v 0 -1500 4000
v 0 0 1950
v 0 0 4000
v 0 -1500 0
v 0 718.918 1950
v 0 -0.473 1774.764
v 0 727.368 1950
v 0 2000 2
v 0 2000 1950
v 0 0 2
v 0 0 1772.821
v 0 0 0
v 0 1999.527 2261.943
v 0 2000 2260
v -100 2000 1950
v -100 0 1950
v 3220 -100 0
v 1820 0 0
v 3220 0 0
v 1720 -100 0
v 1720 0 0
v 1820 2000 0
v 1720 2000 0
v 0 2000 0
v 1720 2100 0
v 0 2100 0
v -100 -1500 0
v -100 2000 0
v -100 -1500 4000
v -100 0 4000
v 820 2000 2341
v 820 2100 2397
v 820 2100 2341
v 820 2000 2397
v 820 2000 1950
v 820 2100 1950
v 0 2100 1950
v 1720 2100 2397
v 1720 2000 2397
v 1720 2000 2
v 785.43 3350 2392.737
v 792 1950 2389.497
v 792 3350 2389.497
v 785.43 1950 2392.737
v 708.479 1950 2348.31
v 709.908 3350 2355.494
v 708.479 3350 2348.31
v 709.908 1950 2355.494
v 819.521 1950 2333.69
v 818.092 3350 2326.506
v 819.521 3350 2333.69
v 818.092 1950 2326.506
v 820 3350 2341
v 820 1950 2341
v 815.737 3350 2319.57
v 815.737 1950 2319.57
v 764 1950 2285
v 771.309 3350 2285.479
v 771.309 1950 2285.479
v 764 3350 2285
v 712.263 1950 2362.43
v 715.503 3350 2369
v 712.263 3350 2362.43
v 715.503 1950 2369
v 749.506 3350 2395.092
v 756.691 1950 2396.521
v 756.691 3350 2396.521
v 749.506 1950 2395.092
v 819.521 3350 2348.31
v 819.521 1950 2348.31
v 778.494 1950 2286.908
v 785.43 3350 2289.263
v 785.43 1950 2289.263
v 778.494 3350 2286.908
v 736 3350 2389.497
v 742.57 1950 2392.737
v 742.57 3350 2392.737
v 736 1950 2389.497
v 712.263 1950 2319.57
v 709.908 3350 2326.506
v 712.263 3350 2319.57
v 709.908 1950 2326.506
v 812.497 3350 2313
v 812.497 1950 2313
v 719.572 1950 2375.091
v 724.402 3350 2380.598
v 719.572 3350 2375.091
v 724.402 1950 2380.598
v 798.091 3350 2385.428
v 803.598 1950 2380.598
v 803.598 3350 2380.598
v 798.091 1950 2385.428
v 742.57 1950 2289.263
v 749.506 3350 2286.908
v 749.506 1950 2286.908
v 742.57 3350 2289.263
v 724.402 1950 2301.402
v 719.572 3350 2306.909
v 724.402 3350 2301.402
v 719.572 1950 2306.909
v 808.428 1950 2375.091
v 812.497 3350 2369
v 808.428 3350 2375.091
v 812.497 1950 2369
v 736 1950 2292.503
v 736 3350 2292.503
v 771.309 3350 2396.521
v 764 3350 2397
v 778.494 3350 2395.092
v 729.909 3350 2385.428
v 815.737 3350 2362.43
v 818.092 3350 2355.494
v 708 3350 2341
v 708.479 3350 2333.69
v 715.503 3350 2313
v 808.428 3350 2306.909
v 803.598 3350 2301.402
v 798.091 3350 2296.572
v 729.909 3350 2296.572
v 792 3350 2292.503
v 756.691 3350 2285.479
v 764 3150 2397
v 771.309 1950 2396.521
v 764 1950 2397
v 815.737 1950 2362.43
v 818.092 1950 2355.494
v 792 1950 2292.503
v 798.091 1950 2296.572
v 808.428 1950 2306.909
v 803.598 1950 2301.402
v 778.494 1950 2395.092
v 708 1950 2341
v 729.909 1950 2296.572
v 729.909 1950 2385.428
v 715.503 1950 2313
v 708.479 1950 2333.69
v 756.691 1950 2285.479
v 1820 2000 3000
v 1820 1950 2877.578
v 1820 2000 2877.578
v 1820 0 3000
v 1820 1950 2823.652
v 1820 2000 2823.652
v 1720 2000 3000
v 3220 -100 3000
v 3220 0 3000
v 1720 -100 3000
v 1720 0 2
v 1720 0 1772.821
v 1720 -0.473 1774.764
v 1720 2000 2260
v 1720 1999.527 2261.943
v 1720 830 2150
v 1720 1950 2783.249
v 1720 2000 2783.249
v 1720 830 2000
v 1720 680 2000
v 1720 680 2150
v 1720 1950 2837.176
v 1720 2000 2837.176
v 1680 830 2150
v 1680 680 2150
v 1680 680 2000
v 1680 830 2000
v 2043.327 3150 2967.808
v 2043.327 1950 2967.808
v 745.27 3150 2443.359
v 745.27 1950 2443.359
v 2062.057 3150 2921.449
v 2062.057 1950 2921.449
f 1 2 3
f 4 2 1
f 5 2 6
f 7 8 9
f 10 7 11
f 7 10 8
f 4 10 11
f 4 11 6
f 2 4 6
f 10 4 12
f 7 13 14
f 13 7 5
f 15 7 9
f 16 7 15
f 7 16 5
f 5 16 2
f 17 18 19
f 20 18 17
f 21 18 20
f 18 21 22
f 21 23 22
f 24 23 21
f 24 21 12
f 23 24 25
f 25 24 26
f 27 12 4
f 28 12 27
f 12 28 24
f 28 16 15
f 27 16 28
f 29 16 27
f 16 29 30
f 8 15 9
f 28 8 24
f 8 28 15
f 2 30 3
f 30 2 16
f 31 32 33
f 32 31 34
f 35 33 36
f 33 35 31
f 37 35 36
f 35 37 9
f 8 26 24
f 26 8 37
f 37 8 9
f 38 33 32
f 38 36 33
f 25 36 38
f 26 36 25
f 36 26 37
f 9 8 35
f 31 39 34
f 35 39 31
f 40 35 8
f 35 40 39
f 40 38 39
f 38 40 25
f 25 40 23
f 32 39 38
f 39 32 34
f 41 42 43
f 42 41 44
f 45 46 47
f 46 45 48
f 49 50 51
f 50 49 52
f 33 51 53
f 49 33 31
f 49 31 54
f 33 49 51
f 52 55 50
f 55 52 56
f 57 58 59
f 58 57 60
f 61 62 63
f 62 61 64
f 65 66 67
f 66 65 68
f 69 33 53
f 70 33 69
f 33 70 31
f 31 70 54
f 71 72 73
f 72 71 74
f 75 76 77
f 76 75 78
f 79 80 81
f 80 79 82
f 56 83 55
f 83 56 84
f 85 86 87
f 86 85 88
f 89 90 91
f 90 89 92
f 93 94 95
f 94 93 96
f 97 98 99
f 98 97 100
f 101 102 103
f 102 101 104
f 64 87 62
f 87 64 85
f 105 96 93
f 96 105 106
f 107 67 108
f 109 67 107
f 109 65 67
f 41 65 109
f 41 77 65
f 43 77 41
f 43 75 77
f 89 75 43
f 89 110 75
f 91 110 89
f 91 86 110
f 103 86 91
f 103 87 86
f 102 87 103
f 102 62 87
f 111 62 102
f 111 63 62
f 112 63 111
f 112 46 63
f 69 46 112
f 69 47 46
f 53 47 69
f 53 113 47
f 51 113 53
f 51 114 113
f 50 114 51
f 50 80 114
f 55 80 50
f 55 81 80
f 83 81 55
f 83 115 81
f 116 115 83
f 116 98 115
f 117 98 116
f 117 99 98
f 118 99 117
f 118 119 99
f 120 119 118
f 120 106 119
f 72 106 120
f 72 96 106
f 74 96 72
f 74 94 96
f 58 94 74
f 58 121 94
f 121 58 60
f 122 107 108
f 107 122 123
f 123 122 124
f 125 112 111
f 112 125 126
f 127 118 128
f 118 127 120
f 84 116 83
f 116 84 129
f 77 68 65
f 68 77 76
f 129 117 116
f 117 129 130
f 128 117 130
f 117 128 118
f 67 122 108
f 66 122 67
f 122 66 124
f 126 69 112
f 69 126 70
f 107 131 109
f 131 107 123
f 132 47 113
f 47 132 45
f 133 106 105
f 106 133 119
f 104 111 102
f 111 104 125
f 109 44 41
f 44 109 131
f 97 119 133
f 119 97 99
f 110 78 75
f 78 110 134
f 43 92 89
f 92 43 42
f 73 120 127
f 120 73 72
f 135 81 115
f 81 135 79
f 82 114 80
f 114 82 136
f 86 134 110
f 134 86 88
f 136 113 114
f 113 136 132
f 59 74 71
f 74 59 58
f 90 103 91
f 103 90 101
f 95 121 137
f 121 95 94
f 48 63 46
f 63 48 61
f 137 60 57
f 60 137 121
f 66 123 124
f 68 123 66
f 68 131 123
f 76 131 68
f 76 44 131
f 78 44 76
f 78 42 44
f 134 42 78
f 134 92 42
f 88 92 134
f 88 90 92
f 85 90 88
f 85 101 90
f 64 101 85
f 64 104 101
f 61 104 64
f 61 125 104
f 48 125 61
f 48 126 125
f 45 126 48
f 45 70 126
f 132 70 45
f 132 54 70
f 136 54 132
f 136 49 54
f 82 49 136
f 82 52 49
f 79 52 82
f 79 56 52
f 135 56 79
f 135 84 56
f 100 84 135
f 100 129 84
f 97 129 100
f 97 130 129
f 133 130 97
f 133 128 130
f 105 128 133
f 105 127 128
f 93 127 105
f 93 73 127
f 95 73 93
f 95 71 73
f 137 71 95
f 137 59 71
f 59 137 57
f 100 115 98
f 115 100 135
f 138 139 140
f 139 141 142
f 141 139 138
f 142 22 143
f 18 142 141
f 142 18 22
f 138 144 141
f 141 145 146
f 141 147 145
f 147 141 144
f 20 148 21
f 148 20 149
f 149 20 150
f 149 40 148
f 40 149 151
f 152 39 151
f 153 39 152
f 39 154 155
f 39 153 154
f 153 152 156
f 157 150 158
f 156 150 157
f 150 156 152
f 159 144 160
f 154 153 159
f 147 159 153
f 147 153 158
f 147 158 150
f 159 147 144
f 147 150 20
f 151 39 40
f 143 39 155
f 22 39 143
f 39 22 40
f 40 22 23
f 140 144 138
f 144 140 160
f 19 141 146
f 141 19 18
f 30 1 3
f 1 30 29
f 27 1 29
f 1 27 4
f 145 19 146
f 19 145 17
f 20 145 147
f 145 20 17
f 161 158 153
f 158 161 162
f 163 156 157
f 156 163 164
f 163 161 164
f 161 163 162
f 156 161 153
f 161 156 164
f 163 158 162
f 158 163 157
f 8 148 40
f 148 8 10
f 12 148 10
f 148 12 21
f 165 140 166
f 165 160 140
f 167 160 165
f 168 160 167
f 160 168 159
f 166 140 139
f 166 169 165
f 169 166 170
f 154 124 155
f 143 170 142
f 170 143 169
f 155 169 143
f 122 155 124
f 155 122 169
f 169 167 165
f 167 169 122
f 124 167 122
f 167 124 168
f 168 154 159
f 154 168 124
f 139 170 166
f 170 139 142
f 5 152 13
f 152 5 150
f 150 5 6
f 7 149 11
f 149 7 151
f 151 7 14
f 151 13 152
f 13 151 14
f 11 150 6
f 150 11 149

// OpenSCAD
// file: site.scad
// ─────────────────────────────────────────────────────────
// Courtyard Nook — SITE CONSTRAINTS
// What is already there and cannot be changed. Measured on site.
// All dimensions in mm. Site notes were recorded in cm; values here are ×10.
//
// Nothing the shed is *made of* belongs in this file — that is
// `parameters.scad`, which includes this one.
// ─────────────────────────────────────────────────────────
//
// Viewpoint: standing in the courtyard looking into the nook.
// Plan: courtyard is a wide rectangle; the nook is on the far side,
// flush left — left edge of nook = left edge of courtyard.
//
// Walls:
//   Left        = brick (nook enclosure)
//   Back        = brick for the first 820mm from the left, then the
//                 neighbour's house wall takes over and rises above it
//   Right       = house wall (tall; bathroom extractor)
//
// Origin: front-left of the nook opening, ground level
//   X: left → right
//   Y: opening → into the nook (toward the back wall)
//   Z: up

// ─── Nook clear envelope (interior face to interior face) ───
// Right-side depth (house wall → main courtyard) is the clear depth.
// Left-side 1800 was to a courtyard wall-edge feature, not an angled back.
nook_width = 1720;
nook_depth = 2000;              // right side to main courtyard
left_to_wall_edge = 1800;       // site note: left side to courtyard wall edge

// ─── Wall heights ───
brick_wall_height = 1950;             // left + back brick in the nook
house_wall_height = 3000;             // right wall (house)
courtyard_left_wall_height = 4000;    // left wall where it meets the courtyard

// Schematic masonry thickness (not measured — visual only)
wall_t = 100;

// Courtyard wall stubs beyond the nook (1–2 m)
courtyard_stub_len = 1500;

// ─── Back wall: brick run, then the neighbour's house ───
// MEASURED: the back of the nook is not one flat wall. From the left
// corner the brick runs 820mm, then the neighbour's house wall
// interrupts it and continues to the right-hand (house) wall.
back_brick_run = 820;                             // left corner → neighbour's wall
neighbour_wall_run = nook_width - back_brick_run; // 900 — derived

// ─── Neighbour's gutter (one of the two roof height constraints) ───
// The gutter does NOT run across our back wall. It runs along the neighbour's
// eaves, away from us (+Y) into their property, and only its near END reaches
// back over our nook — by a few cm past the back wall plane. That end is the
// only part of it in our space, and it is the part we have to duck under.
//
// MEASURED: the underside sits 335mm above the top of the flat (brick) part
// of the back wall.
gutter_underside_above_brick = 335;                                    // measured
gutter_underside_z = brick_wall_height + gutter_underside_above_brick;  // 2285 — derived

// ASSUMED — "a few cm" was eyeballed on site, not measured. Remeasure before
// committing to a roof: how far the gutter END reaches into the nook (−Y).
gutter_projection = 50;

// Schematic gutter section and length (not measured — visual only).
gutter_dia = 112;
gutter_run = 1400;   // how far it carries on into their property (+Y)

// Sits just left of the step in the back wall, hanging off the west face of
// the neighbour's flank wall. X position inferred from the sketch, not measured.
gutter_centre_x = back_brick_run - gutter_dia / 2;   // 764 — derived

// ─── Neighbour's roof above the gutter (all schematic, none measured) ───
neighbour_eaves_z    = gutter_underside_z + gutter_dia;  // top of fascia — derived
neighbour_roof_pitch = 22;      // degrees, rising toward +X (right)
neighbour_roof_run   = 1400;    // how far the drawn roof slope extends in X
neighbour_roof_depth = 1200;    // how far it extends away from us in +Y
neighbour_roof_t     = 50;

// ─── Bathroom extractor on the right (house) wall ───
// "68 from left of extractor to edge with rest of the courtyard"
// → along the house wall, left edge of extractor is 680mm in from Y=0.
extractor_bottom_z = 2000;
extractor_w = 150;  // along the wall (Y)
extractor_h = 150;
extractor_d = 40;   // projects into the nook (−X from house face)
extractor_from_courtyard_edge = 680;

// ─── Site rendering ───
floor_ghost_t     = 2;
floor_ghost_alpha = 0.45;
curve_fn          = 48;     // $fn for the gutter

show_nook_walls      = true;
show_courtyard_stubs = true;
show_extractor       = true;
show_floor_ghost     = true;
show_neighbour_roof  = true;

brick_colour        = [0.72, 0.42, 0.32];
house_colour        = [0.82, 0.80, 0.76];
neighbour_colour    = [0.66, 0.60, 0.56];
neighbour_roof_col  = [0.40, 0.36, 0.34];
gutter_colour       = [0.25, 0.25, 0.27];
extractor_colour    = [0.35, 0.35, 0.38];
floor_colour        = [0.55, 0.62, 0.55];
// file: shed.scad
// ─────────────────────────────────────────────────────────
// Courtyard Nook — Shed geometry
// The thing we are building. Driven by `parameters.scad`.
// Nothing is designed yet; only the site-imposed roof limit is drawn.
// ─────────────────────────────────────────────────────────

include <parameters.scad>

// The steepest roof plane the site allows. It grazes two fixed obstructions
// at two different depths — the far bottom edge of the bathroom extractor
// near the opening, and the underside of the neighbour's gutter end at the
// back wall — which between them fix the pitch. Anything of ours that pokes
// up through this plane does not fit.
module roof_limit_plane() {
    color(clearance_colour, ghost_alpha)
        translate([0, 0, roof_limit_z_at_front])
            rotate([roof_max_pitch, 0, 0])
                cube([nook_width, nook_depth / cos(roof_max_pitch), ghost_t]);
}
// file: walls.scad
// ─────────────────────────────────────────────────────────
// Courtyard Nook — Walls & site envelope
// Geometry of what is already there. Driven by `site.scad` only —
// nothing here may depend on the shed's own dimensions.
// ─────────────────────────────────────────────────────────

include <site.scad>

// Left brick wall (interior at X=0), thickness outward (−X)
module nook_left_wall() {
    color(brick_colour)
        translate([-wall_t, 0, 0])
            cube([wall_t, nook_depth, brick_wall_height]);
}

// Back brick wall (interior at Y=nook_depth), thickness outward (+Y).
// Runs only `back_brick_run` from the left corner — beyond that the
// neighbour's house wall takes over.
module nook_back_wall() {
    color(brick_colour)
        translate([0, nook_depth, 0])
            cube([back_brick_run, wall_t, brick_wall_height]);
}

// Neighbour's house wall — completes the back of the nook from
// `back_brick_run` across to the house wall, rising past the brick to the
// eaves. Assumed flush with the brick back face (Y=nook_depth); not measured.
module neighbour_house_wall() {
    color(neighbour_colour)
        translate([back_brick_run, nook_depth, 0])
            cube([neighbour_wall_run, wall_t, neighbour_eaves_z]);
}

// Neighbour's gutter — runs along their eaves away from us (+Y), so almost
// all of it is over their property. Only its near end reaches back over our
// nook, by `gutter_projection`, and that end is what our roof must clear.
module neighbour_gutter() {
    color(gutter_colour)
        translate([
            gutter_centre_x,
            nook_depth - gutter_projection,
            gutter_underside_z + gutter_dia / 2
        ])
            rotate([-90, 0, 0])
                cylinder(h = gutter_run, d = gutter_dia, $fn = curve_fn);
}

// Neighbour's roof above the gutter, sloping up to the right. Schematic
// context only — pitch, run and depth are all unmeasured.
module neighbour_roof() {
    color(neighbour_roof_col)
        translate([gutter_centre_x, nook_depth - gutter_projection, neighbour_eaves_z])
            rotate([0, -neighbour_roof_pitch, 0])
                cube([neighbour_roof_run, neighbour_roof_depth, neighbour_roof_t]);
}

// Right house wall (interior at X=nook_width), thickness outward (+X)
module nook_right_wall() {
    color(house_colour)
        translate([nook_width, 0, 0])
            cube([wall_t, nook_depth, house_wall_height]);
}

// Floor ghost of the rectangular nook footprint
module nook_floor() {
    color(floor_colour, floor_ghost_alpha)
        cube([nook_width, nook_depth, floor_ghost_t]);
}

// Bathroom extractor on the house (right) wall, projecting into the nook
module bathroom_extractor() {
    color(extractor_colour)
        translate([
            nook_width - extractor_d,
            extractor_from_courtyard_edge,
            extractor_bottom_z
        ])
            cube([extractor_d, extractor_w, extractor_h]);
}

// Courtyard stubs beyond the nook opening
//
// 1) Left wall continues past the opening (−Y) — rises high (~4 m)
// 2) Far courtyard / house return continues past the nook (+X) along the
//    opening line (Y=0), schematic only
module courtyard_stubs() {
    // Tall left courtyard wall (same plane as nook left brick)
    color(brick_colour)
        translate([-wall_t, -courtyard_stub_len, 0])
            cube([wall_t, courtyard_stub_len, courtyard_left_wall_height]);

    // Stub along the courtyard far edge, right of the nook opening
    color(house_colour)
        translate([nook_width, -wall_t, 0])
            cube([courtyard_stub_len, wall_t, house_wall_height]);
}

module nook_walls() {
    nook_left_wall();
    nook_back_wall();
    neighbour_house_wall();
    neighbour_gutter();
    nook_right_wall();
}
// file: parameters.scad
// ─────────────────────────────────────────────────────────
// Courtyard Nook — SHED BUILD PARAMETERS
// Dimensions of the thing we are building. This file is the input to
// the cut-list script (`extraction.py` → `data/cut_list.json`), so every
// number a cut depends on must live here, not inside a module.
//
// Site measurements (walls, gutter, extractor) live in `site.scad`,
// which this file includes so the build can be derived from the site.
// All dimensions in mm.
// ─────────────────────────────────────────────────────────

include <site.scad>

// ─── What the site allows us to build into ───
// Absolute outer envelope, before any working clearance to the walls.
shed_max_width = nook_width;
shed_max_depth = nook_depth;

// ─── The two things the roof must pass under ───
// Each is a fixed obstruction at a known depth into the nook, so together
// they fix the highest roof plane we can build — and therefore its pitch.
//
//   near the opening : the bathroom extractor, bottom at 2000mm
//   at the back wall : the neighbour's gutter end, underside at 2285mm
//
// The gutter is the higher of the two and sits deeper in, so the roof rises
// toward the back and drains out toward the courtyard opening.
roof_extractor_clearance = 25;   // ASSUMED — raise it if the fan needs free air
roof_gutter_clearance    = 25;   // ASSUMED working clearance under the lip

// The extractor's binding point is its FAR edge (deepest into the nook),
// because the roof is rising as it passes beneath it.
roof_limit_y_at_extractor = extractor_from_courtyard_edge + extractor_w;   // 830
roof_limit_z_at_extractor = extractor_bottom_z - roof_extractor_clearance; // 1975

// The gutter's binding point is the back wall, where our roof stops and is
// therefore at its highest under the overhanging end.
roof_limit_y_at_gutter = nook_depth;                                    // 2000
roof_limit_z_at_gutter = gutter_underside_z - roof_gutter_clearance;    // 2260

// The limit plane runs through both points. This pitch is a ceiling, not a
// choice: build shallower and you lose headroom, steeper and you hit something.
roof_max_rise  = roof_limit_z_at_gutter - roof_limit_z_at_extractor;   // 285
roof_max_run   = roof_limit_y_at_gutter - roof_limit_y_at_extractor;   // 1170
roof_max_fall  = roof_max_rise / roof_max_run;                         // 0.2436
roof_max_pitch = atan(roof_max_fall);                                  // 13.7 deg

// Where that plane crosses the nook opening (Y=0) and the back wall.
roof_limit_z_at_front = roof_limit_z_at_extractor
                      - roof_limit_y_at_extractor * roof_max_fall;     // 1773

// Left of `back_brick_run` the back brick tops out at `brick_wall_height` and
// what sits above it has not been measured — do not assume that headroom is
// free until it is checked on site.

// ─── TODO — not yet designed, and nothing can be cut until they are ───
// Add here, then teach `extraction.py` to emit rows for each:
//   * frame:    post section, rail section, post positions, frame height
//   * roof:     pitch, fall direction, rafter section/spacing, deck material
//   * cladding: board type, coverage, batten section
//   * floor:    bearer section, deck material
//   * openings: door/access width, height, clearances

// ─── Shed rendering ───
ghost_alpha      = 0.30;
ghost_t          = 2;
show_roof_limit  = true;   // translucent plane at the highest buildable roof
clearance_colour = [0.95, 0.35, 0.25];
// main file
// ─────────────────────────────────────────────────────────
// Courtyard Nook — Main Assembly
// Origin: front-left of nook opening (courtyard side), ground
// X: left → right
// Y: opening → into nook
// Z: up
// ─────────────────────────────────────────────────────────

include <parameters.scad>   // pulls in site.scad
use <walls.scad>
use <shed.scad>

if (show_nook_walls)       nook_walls();
if (show_courtyard_stubs)  courtyard_stubs();
if (show_extractor)        bathroom_extractor();
if (show_floor_ghost)      nook_floor();
if (show_neighbour_roof)   neighbour_roof();
if (show_roof_limit)       roof_limit_plane();
